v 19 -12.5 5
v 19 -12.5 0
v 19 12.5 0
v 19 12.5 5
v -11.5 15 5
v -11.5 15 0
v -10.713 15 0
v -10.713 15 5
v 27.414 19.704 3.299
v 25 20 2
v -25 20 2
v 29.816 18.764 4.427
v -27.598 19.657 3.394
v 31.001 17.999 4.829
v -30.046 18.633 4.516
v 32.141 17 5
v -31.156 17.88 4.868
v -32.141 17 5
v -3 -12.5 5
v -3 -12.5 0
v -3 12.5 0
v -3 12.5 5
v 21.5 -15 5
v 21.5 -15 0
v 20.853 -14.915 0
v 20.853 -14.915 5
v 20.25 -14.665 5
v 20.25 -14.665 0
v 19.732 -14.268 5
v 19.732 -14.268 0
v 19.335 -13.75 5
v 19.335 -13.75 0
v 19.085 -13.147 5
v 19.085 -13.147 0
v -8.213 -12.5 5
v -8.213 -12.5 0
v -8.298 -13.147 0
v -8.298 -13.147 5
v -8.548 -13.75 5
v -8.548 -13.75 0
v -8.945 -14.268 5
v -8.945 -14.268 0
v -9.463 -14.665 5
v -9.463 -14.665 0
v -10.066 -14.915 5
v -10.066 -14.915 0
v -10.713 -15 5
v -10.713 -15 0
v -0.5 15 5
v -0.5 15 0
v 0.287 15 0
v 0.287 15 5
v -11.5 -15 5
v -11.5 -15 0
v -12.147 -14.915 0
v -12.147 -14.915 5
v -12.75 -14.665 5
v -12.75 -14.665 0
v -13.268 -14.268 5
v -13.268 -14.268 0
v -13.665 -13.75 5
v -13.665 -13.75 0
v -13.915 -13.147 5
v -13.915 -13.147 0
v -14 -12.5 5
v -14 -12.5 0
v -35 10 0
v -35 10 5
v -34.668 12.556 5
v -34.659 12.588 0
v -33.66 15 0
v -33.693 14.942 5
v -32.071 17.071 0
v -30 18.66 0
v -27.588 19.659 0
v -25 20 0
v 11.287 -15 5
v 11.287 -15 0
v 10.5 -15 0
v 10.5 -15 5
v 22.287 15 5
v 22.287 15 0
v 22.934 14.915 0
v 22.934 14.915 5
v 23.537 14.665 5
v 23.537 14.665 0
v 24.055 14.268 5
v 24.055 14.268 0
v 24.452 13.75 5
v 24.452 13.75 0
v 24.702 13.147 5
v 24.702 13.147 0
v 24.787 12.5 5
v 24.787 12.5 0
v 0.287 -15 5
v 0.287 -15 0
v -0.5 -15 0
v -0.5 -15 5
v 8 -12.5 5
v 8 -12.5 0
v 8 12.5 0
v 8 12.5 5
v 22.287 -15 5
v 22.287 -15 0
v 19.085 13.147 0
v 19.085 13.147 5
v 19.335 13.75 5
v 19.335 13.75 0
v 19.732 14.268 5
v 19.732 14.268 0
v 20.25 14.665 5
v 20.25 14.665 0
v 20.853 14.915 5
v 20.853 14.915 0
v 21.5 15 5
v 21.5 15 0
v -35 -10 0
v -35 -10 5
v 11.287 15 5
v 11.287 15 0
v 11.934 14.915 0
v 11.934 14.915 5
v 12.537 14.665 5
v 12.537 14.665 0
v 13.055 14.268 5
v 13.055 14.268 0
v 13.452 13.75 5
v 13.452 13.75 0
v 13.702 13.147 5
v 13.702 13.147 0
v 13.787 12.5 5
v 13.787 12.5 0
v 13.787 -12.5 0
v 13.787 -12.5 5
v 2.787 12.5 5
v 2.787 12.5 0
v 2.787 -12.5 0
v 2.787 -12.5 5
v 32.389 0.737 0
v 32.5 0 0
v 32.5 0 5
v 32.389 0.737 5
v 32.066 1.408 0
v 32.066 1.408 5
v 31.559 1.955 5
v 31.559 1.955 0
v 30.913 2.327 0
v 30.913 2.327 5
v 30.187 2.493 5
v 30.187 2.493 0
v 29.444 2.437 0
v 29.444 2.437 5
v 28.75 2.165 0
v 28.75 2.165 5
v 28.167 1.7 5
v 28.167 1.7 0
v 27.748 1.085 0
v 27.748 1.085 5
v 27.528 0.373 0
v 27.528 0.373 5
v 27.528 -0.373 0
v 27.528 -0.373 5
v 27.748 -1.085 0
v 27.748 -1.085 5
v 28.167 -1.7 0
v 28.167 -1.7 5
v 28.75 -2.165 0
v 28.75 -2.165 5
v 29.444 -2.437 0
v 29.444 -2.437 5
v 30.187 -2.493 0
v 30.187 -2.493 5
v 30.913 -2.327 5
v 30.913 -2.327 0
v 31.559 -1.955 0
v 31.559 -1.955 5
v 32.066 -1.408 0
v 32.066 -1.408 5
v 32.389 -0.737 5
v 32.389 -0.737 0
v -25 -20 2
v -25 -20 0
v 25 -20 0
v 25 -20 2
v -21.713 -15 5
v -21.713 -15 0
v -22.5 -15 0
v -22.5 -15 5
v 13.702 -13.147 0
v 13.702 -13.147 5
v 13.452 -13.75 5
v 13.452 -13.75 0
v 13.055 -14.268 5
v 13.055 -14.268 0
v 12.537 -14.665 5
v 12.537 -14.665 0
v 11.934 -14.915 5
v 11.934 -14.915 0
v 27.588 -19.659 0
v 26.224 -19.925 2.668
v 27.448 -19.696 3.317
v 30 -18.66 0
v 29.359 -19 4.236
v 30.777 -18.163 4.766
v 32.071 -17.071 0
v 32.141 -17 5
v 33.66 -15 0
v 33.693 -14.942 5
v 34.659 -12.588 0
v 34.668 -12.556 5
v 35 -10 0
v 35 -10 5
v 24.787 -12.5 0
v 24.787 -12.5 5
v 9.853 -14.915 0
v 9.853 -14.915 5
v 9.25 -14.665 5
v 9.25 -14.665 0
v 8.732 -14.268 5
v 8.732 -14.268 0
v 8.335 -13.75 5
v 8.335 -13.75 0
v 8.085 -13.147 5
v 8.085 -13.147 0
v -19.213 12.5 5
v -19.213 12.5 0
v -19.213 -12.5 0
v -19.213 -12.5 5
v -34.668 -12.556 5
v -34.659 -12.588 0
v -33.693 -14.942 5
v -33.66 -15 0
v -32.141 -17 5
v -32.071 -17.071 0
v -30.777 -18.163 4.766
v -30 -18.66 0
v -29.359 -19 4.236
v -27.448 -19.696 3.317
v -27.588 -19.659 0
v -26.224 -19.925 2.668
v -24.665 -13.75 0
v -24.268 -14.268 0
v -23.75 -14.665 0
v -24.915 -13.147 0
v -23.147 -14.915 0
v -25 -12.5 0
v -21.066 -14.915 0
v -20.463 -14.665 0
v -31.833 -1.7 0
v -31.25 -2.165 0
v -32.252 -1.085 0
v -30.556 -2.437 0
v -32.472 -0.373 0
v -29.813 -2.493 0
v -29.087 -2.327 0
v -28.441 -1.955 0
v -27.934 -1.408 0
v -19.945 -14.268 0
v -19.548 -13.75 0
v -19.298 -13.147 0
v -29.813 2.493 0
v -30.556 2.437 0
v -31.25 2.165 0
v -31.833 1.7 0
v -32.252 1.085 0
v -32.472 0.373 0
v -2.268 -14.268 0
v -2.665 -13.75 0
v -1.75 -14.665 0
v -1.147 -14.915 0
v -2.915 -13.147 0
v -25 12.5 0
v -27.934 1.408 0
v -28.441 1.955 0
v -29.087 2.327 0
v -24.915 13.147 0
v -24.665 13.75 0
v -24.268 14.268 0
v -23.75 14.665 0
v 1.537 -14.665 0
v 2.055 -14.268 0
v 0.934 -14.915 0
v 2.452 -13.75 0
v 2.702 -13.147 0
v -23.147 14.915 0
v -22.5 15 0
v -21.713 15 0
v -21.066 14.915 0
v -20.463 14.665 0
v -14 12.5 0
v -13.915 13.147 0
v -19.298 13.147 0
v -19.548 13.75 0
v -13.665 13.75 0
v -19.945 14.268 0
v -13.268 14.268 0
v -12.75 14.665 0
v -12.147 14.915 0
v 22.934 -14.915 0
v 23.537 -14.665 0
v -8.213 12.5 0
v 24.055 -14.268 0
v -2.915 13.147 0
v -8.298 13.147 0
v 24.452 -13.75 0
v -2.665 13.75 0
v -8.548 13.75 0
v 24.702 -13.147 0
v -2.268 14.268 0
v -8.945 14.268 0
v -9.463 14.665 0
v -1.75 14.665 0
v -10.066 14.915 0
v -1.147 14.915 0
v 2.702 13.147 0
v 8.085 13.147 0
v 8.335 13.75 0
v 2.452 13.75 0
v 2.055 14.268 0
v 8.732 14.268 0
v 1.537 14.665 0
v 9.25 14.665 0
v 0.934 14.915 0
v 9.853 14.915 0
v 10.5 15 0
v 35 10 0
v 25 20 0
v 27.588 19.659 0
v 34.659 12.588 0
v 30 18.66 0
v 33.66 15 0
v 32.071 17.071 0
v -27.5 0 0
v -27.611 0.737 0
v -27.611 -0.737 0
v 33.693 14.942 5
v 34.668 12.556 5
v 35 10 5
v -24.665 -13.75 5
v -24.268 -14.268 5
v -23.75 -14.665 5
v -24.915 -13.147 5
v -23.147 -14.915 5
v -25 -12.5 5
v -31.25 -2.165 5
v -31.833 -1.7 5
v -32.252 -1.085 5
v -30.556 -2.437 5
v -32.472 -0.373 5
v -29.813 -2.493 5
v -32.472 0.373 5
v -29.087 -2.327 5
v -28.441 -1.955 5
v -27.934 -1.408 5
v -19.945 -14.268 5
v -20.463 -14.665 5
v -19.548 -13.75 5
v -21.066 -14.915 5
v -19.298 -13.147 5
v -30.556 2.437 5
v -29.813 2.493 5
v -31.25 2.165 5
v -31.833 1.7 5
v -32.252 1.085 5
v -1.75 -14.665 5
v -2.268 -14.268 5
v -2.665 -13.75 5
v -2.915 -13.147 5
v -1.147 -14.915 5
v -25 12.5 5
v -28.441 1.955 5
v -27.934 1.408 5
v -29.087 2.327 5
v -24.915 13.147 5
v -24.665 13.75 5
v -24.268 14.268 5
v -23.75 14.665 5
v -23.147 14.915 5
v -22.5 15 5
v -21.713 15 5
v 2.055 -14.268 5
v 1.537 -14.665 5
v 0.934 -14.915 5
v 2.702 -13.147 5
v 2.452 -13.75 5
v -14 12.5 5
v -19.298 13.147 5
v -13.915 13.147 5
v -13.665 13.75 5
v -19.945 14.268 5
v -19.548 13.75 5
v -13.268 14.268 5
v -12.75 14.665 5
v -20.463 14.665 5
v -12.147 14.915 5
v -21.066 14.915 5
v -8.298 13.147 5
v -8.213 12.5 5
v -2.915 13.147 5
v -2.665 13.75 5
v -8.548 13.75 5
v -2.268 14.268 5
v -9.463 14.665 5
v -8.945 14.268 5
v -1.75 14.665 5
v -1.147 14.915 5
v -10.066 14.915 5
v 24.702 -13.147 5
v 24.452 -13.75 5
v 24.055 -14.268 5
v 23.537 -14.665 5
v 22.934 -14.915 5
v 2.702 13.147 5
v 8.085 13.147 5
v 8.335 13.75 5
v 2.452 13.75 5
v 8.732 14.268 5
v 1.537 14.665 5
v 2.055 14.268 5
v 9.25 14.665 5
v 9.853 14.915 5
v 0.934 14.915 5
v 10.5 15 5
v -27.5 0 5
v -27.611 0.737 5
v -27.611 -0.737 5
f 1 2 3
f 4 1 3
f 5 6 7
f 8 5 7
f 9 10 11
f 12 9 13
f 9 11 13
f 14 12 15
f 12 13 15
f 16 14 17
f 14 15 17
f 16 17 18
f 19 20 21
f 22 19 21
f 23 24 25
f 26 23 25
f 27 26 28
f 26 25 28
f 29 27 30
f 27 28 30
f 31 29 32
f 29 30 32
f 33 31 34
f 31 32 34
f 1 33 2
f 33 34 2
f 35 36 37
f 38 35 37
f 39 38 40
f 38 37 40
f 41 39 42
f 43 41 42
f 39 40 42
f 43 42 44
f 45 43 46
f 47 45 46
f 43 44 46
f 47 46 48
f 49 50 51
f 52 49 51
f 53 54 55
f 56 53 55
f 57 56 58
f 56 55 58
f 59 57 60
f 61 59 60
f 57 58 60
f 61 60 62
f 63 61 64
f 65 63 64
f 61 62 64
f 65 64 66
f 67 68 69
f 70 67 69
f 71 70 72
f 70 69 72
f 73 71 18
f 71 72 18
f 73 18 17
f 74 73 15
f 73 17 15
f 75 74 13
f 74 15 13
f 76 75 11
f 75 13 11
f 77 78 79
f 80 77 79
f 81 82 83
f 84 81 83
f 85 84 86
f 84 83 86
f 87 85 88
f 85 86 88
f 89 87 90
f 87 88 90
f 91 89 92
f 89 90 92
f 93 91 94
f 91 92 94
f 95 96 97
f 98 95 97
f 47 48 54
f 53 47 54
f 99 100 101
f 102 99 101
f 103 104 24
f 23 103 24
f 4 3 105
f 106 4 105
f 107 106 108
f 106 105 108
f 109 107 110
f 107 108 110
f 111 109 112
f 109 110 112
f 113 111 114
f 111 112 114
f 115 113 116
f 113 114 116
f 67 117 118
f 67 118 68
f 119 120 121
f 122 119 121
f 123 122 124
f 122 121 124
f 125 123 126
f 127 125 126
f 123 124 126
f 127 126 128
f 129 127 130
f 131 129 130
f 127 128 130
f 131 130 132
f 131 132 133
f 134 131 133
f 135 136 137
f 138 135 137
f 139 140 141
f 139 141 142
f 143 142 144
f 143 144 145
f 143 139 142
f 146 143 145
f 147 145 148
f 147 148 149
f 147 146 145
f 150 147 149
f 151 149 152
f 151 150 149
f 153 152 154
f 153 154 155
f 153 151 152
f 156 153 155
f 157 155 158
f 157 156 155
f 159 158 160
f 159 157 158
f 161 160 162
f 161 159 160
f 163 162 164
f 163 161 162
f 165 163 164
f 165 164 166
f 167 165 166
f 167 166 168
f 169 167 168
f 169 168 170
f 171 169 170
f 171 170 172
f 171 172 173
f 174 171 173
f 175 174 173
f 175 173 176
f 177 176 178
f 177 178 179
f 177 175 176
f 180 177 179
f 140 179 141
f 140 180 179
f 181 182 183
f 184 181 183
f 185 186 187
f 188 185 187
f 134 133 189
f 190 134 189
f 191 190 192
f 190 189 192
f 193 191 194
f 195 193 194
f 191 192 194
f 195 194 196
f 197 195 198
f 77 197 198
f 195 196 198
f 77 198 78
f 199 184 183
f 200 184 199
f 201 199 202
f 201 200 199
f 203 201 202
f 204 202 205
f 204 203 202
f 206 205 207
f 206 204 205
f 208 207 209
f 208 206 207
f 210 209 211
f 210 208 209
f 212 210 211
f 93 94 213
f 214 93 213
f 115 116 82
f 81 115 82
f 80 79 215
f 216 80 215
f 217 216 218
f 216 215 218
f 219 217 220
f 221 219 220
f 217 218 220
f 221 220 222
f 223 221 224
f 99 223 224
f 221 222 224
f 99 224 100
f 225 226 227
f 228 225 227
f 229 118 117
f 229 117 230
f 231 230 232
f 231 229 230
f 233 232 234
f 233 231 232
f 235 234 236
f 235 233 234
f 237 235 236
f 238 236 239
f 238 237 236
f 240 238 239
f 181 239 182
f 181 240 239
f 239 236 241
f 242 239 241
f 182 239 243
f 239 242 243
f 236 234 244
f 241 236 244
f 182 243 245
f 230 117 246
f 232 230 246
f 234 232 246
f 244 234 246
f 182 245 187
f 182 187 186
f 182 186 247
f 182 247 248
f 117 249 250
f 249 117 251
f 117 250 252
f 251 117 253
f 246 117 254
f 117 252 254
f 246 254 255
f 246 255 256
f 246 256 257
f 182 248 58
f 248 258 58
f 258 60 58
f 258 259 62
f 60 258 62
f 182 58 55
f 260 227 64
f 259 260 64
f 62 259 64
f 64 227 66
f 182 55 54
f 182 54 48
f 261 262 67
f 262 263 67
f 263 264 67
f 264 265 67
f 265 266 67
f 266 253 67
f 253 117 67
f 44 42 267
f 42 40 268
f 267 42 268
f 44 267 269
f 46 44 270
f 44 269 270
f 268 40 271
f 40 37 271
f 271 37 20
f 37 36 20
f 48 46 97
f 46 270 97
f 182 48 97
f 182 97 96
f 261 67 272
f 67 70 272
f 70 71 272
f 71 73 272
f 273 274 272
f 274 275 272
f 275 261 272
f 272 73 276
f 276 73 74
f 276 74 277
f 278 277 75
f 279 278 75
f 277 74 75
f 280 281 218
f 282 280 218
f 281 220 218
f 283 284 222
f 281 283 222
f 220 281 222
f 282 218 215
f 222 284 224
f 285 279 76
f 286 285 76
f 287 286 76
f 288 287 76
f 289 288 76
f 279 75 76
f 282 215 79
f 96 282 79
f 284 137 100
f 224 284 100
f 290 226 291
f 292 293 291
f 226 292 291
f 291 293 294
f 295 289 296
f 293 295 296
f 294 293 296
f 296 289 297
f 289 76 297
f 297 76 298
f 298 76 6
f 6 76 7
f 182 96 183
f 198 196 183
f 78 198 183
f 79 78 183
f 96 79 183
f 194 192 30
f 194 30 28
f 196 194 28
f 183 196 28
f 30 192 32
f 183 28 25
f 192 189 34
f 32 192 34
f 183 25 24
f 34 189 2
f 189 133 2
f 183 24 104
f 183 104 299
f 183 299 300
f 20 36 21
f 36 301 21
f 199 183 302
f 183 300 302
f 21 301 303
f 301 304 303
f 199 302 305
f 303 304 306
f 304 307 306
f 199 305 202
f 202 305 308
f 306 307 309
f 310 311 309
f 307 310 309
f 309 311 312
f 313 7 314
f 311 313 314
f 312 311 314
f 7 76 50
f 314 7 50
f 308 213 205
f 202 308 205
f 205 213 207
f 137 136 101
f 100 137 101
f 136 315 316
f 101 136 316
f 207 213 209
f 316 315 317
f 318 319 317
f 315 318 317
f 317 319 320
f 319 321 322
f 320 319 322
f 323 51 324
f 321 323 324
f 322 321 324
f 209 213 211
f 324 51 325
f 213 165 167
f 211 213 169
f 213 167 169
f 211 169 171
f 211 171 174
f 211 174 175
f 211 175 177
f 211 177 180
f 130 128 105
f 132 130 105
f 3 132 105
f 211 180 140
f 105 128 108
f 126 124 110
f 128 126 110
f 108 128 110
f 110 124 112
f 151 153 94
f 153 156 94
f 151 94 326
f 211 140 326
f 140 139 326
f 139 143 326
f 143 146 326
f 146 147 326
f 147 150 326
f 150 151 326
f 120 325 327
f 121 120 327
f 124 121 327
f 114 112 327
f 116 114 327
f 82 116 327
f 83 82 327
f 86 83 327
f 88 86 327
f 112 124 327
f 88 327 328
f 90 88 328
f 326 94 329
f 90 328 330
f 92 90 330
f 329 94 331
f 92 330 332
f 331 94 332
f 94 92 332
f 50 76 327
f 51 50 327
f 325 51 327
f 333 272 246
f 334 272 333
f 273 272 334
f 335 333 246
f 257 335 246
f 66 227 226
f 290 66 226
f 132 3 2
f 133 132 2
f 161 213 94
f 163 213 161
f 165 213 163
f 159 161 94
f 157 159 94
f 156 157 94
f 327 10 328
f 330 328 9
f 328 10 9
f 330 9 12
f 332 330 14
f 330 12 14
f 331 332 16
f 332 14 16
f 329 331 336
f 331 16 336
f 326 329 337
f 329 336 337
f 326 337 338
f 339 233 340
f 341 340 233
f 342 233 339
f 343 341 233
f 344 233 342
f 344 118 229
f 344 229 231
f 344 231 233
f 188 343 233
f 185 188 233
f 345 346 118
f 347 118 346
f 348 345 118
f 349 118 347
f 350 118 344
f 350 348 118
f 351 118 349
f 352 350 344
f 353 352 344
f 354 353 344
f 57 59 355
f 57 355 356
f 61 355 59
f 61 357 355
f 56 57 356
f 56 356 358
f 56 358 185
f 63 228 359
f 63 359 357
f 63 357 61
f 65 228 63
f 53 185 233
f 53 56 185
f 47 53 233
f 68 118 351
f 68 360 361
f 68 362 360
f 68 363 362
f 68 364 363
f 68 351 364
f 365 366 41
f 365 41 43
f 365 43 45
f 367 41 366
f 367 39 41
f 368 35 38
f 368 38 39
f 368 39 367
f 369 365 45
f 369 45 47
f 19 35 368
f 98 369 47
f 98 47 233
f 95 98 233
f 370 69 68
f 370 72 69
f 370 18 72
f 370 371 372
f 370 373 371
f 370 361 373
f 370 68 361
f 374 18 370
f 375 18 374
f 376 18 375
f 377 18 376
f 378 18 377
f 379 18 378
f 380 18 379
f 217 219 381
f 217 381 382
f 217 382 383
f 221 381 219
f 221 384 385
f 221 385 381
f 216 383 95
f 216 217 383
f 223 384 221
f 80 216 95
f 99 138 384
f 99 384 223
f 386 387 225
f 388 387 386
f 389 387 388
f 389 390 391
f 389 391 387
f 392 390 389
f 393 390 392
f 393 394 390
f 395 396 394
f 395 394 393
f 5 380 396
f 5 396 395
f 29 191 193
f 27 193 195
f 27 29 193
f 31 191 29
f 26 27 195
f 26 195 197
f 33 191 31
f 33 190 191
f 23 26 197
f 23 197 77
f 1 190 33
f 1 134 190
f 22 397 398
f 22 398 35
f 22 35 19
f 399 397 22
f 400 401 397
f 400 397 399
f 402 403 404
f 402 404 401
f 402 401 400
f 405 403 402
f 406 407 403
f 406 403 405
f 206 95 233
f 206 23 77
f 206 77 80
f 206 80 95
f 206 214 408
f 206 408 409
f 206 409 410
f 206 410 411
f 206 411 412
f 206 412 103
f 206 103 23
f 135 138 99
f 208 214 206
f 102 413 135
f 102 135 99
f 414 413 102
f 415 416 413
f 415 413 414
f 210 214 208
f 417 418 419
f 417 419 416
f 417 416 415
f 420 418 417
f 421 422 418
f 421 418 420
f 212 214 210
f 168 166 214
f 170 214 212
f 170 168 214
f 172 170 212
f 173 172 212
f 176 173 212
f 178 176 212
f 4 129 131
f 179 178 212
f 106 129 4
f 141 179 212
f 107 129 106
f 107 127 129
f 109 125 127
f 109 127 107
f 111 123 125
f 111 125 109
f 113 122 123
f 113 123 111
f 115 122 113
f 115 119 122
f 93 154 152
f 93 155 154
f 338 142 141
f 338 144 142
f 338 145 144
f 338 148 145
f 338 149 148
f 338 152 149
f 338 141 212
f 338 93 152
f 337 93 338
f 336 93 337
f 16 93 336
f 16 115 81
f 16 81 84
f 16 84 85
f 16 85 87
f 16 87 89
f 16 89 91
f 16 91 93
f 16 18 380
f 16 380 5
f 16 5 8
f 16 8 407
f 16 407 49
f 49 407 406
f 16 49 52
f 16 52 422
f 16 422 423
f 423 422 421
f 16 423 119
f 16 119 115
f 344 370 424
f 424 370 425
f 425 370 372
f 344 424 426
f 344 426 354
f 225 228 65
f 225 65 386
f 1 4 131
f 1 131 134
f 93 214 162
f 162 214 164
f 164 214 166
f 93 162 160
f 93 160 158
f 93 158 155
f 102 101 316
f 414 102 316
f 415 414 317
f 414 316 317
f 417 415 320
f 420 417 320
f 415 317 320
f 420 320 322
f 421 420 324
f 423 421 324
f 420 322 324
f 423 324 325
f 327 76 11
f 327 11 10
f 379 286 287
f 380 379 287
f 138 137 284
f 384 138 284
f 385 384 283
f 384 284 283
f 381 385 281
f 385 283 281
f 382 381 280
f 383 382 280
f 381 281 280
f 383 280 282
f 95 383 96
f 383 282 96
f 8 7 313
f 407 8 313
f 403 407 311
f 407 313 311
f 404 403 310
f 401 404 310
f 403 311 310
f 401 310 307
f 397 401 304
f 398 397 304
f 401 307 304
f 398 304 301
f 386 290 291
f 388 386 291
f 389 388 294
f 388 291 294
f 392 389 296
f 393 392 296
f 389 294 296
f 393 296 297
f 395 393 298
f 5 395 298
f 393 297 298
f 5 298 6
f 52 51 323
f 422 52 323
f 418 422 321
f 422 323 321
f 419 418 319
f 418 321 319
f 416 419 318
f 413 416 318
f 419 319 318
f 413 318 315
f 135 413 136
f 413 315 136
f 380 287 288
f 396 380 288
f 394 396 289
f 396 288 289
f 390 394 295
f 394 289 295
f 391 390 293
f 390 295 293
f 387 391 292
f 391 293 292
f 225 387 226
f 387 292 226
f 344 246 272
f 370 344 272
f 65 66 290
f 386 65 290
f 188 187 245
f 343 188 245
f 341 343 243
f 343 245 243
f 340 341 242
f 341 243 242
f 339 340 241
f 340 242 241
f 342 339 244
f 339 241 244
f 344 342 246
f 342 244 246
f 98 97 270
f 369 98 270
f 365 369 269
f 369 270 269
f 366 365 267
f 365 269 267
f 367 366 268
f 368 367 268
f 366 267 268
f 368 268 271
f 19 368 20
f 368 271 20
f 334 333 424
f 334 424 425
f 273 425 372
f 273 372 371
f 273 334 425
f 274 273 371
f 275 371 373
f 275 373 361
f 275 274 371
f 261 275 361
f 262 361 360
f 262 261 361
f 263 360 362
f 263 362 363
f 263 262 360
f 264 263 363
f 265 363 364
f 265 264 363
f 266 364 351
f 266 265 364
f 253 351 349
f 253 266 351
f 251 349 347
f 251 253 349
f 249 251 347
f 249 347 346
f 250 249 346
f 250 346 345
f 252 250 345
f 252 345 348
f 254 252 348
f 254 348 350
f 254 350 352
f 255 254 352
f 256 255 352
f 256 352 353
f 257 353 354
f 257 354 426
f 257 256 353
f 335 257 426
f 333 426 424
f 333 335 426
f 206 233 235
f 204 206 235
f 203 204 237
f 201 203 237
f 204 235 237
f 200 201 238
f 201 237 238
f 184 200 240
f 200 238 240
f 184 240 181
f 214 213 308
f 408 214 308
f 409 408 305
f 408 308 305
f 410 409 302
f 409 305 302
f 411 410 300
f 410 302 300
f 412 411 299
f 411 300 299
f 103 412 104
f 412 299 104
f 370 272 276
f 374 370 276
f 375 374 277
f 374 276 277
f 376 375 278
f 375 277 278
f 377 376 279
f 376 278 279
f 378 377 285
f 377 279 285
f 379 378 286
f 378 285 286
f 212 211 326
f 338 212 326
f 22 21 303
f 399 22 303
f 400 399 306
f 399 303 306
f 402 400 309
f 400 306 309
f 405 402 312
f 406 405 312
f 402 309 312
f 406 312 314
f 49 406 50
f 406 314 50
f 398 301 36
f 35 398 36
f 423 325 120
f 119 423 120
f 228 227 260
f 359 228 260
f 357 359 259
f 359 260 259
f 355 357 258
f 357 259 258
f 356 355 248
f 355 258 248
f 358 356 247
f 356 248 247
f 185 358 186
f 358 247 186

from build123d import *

# Parameters (mm, degrees)
F0_W        = 70
F0_H        = 40
F0_R        = 2.5
F1_DEPTH    = 5
F2_R        = 10
F3_T1_DEPTH = 65


# Not quite as in the source:
# - a fillet or chamfer that OpenCascade refuses, or shapes differently, is made with other operations: its cross-section is extruded or revolved along the edge and cut away or added


with BuildPart() as f1:
    # F0 (on Top) → F1 (new body)
    with BuildSketch(Plane.XY):
        Rectangle(F0_W, F0_H)
        with Locations((-30, 0)):
            Circle(F0_R, mode=Mode.SUBTRACT)
        with BuildLine():
            ThreePointArc((-25, 12.5), (-24.267766953, 14.267766953), (-22.5, 15))
            Line((-22.5, 15), (-21.7131334842, 15))
            ThreePointArc((-21.7131334842, 15), (-19.9453665312, 14.267766953), (-19.2131334842, 12.5))
            Line((-19.2131334842, 12.5), (-19.2131334842, -12.5))
            ThreePointArc((-19.2131334842, -12.5), (-19.9453665312, -14.267766953), (-21.7131334842, -15))
            Line((-21.7131334842, -15), (-22.5, -15))
            ThreePointArc((-22.5, -15), (-24.267766953, -14.267766953), (-25, -12.5))
            Line((-25, -12.5), (-25, 12.5))
        make_face(mode=Mode.SUBTRACT)
        with BuildLine():
            Line((-14, -12.5), (-14, 12.5))
            ThreePointArc((-14, 12.5), (-13.267766953, 14.267766953), (-11.5, 15))
            Line((-11.5, 15), (-10.7131334842, 15))
            ThreePointArc((-10.7131334842, 15), (-8.9453665312, 14.267766953), (-8.2131334842, 12.5))
            Line((-8.2131334842, 12.5), (-8.2131334842, -12.5))
            ThreePointArc((-8.2131334842, -12.5), (-8.9453665312, -14.267766953), (-10.7131334842, -15))
            Line((-10.7131334842, -15), (-11.5, -15))
            ThreePointArc((-11.5, -15), (-13.267766953, -14.267766953), (-14, -12.5))
        make_face(mode=Mode.SUBTRACT)
        with BuildLine():
            Line((-3, -12.5), (-3, 12.5))
            ThreePointArc((-3, 12.5), (-2.267766953, 14.267766953), (-0.5, 15))
            Line((-0.5, 15), (0.2868665158, 15))
            ThreePointArc((0.2868665158, 15), (2.0546334688, 14.267766953), (2.7868665158, 12.5))
            Line((2.7868665158, 12.5), (2.7868665158, -12.5))
            ThreePointArc((2.7868665158, -12.5), (2.0546334688, -14.267766953), (0.2868665158, -15))
            Line((0.2868665158, -15), (-0.5, -15))
            ThreePointArc((-0.5, -15), (-2.267766953, -14.267766953), (-3, -12.5))
        make_face(mode=Mode.SUBTRACT)
        with BuildLine():
            Line((8, -12.5), (8, 12.5))
            ThreePointArc((8, 12.5), (8.732233047, 14.267766953), (10.5, 15))
            Line((10.5, 15), (11.2868665158, 15))
            ThreePointArc((11.2868665158, 15), (13.0546334688, 14.267766953), (13.7868665158, 12.5))
            Line((13.7868665158, 12.5), (13.7868665158, -12.5))
            ThreePointArc((13.7868665158, -12.5), (13.0546334688, -14.267766953), (11.2868665158, -15))
            Line((11.2868665158, -15), (10.5, -15))
            ThreePointArc((10.5, -15), (8.732233047, -14.267766953), (8, -12.5))
        make_face(mode=Mode.SUBTRACT)
        with BuildLine():
            Line((19, -12.5), (19, 12.5))
            ThreePointArc((19, 12.5), (19.732233047, 14.267766953), (21.5, 15))
            Line((21.5, 15), (22.2868665158, 15))
            ThreePointArc((22.2868665158, 15), (24.0546334688, 14.267766953), (24.7868665158, 12.5))
            Line((24.7868665158, 12.5), (24.7868665158, -12.5))
            ThreePointArc((24.7868665158, -12.5), (24.0546334688, -14.267766953), (22.2868665158, -15))
            Line((22.2868665158, -15), (21.5, -15))
            ThreePointArc((21.5, -15), (19.732233047, -14.267766953), (19, -12.5))
        make_face(mode=Mode.SUBTRACT)
        with Locations((30, 0)):
            Circle(F0_R, mode=Mode.SUBTRACT)
    extrude(amount=F1_DEPTH)

    # F2
    f2_edges = [f1.edges().sort_by_distance(p)[0] for p in [
        (-35, 20, 2.5),
        (-35, -20, 2.5),
        (35, -20, 2.5),
        (35, 20, 2.5),
    ]]
    fillet(f2_edges, radius=F2_R)

    # F3: fillet of radius 3 on 2 edges, made by hand

    # F3_s2 → F3_t1 (cut)
    with BuildSketch(Plane.YZ.offset(-32.5)):
        with BuildLine():
            ThreePointArc((-17, 5), (-19.1213203436, 4.1213203436), (-20, 2))
            Line((-20, 2), (-20, 5))
            Line((-20, 5), (-17, 5))
        make_face()
        with BuildLine():
            ThreePointArc((20, 2), (19.1213203436, 4.1213203436), (17, 5))
            Line((17, 5), (20, 5))
            Line((20, 5), (20, 2))
        make_face()
    extrude(amount=F3_T1_DEPTH, mode=Mode.SUBTRACT)


solid = f1.part
